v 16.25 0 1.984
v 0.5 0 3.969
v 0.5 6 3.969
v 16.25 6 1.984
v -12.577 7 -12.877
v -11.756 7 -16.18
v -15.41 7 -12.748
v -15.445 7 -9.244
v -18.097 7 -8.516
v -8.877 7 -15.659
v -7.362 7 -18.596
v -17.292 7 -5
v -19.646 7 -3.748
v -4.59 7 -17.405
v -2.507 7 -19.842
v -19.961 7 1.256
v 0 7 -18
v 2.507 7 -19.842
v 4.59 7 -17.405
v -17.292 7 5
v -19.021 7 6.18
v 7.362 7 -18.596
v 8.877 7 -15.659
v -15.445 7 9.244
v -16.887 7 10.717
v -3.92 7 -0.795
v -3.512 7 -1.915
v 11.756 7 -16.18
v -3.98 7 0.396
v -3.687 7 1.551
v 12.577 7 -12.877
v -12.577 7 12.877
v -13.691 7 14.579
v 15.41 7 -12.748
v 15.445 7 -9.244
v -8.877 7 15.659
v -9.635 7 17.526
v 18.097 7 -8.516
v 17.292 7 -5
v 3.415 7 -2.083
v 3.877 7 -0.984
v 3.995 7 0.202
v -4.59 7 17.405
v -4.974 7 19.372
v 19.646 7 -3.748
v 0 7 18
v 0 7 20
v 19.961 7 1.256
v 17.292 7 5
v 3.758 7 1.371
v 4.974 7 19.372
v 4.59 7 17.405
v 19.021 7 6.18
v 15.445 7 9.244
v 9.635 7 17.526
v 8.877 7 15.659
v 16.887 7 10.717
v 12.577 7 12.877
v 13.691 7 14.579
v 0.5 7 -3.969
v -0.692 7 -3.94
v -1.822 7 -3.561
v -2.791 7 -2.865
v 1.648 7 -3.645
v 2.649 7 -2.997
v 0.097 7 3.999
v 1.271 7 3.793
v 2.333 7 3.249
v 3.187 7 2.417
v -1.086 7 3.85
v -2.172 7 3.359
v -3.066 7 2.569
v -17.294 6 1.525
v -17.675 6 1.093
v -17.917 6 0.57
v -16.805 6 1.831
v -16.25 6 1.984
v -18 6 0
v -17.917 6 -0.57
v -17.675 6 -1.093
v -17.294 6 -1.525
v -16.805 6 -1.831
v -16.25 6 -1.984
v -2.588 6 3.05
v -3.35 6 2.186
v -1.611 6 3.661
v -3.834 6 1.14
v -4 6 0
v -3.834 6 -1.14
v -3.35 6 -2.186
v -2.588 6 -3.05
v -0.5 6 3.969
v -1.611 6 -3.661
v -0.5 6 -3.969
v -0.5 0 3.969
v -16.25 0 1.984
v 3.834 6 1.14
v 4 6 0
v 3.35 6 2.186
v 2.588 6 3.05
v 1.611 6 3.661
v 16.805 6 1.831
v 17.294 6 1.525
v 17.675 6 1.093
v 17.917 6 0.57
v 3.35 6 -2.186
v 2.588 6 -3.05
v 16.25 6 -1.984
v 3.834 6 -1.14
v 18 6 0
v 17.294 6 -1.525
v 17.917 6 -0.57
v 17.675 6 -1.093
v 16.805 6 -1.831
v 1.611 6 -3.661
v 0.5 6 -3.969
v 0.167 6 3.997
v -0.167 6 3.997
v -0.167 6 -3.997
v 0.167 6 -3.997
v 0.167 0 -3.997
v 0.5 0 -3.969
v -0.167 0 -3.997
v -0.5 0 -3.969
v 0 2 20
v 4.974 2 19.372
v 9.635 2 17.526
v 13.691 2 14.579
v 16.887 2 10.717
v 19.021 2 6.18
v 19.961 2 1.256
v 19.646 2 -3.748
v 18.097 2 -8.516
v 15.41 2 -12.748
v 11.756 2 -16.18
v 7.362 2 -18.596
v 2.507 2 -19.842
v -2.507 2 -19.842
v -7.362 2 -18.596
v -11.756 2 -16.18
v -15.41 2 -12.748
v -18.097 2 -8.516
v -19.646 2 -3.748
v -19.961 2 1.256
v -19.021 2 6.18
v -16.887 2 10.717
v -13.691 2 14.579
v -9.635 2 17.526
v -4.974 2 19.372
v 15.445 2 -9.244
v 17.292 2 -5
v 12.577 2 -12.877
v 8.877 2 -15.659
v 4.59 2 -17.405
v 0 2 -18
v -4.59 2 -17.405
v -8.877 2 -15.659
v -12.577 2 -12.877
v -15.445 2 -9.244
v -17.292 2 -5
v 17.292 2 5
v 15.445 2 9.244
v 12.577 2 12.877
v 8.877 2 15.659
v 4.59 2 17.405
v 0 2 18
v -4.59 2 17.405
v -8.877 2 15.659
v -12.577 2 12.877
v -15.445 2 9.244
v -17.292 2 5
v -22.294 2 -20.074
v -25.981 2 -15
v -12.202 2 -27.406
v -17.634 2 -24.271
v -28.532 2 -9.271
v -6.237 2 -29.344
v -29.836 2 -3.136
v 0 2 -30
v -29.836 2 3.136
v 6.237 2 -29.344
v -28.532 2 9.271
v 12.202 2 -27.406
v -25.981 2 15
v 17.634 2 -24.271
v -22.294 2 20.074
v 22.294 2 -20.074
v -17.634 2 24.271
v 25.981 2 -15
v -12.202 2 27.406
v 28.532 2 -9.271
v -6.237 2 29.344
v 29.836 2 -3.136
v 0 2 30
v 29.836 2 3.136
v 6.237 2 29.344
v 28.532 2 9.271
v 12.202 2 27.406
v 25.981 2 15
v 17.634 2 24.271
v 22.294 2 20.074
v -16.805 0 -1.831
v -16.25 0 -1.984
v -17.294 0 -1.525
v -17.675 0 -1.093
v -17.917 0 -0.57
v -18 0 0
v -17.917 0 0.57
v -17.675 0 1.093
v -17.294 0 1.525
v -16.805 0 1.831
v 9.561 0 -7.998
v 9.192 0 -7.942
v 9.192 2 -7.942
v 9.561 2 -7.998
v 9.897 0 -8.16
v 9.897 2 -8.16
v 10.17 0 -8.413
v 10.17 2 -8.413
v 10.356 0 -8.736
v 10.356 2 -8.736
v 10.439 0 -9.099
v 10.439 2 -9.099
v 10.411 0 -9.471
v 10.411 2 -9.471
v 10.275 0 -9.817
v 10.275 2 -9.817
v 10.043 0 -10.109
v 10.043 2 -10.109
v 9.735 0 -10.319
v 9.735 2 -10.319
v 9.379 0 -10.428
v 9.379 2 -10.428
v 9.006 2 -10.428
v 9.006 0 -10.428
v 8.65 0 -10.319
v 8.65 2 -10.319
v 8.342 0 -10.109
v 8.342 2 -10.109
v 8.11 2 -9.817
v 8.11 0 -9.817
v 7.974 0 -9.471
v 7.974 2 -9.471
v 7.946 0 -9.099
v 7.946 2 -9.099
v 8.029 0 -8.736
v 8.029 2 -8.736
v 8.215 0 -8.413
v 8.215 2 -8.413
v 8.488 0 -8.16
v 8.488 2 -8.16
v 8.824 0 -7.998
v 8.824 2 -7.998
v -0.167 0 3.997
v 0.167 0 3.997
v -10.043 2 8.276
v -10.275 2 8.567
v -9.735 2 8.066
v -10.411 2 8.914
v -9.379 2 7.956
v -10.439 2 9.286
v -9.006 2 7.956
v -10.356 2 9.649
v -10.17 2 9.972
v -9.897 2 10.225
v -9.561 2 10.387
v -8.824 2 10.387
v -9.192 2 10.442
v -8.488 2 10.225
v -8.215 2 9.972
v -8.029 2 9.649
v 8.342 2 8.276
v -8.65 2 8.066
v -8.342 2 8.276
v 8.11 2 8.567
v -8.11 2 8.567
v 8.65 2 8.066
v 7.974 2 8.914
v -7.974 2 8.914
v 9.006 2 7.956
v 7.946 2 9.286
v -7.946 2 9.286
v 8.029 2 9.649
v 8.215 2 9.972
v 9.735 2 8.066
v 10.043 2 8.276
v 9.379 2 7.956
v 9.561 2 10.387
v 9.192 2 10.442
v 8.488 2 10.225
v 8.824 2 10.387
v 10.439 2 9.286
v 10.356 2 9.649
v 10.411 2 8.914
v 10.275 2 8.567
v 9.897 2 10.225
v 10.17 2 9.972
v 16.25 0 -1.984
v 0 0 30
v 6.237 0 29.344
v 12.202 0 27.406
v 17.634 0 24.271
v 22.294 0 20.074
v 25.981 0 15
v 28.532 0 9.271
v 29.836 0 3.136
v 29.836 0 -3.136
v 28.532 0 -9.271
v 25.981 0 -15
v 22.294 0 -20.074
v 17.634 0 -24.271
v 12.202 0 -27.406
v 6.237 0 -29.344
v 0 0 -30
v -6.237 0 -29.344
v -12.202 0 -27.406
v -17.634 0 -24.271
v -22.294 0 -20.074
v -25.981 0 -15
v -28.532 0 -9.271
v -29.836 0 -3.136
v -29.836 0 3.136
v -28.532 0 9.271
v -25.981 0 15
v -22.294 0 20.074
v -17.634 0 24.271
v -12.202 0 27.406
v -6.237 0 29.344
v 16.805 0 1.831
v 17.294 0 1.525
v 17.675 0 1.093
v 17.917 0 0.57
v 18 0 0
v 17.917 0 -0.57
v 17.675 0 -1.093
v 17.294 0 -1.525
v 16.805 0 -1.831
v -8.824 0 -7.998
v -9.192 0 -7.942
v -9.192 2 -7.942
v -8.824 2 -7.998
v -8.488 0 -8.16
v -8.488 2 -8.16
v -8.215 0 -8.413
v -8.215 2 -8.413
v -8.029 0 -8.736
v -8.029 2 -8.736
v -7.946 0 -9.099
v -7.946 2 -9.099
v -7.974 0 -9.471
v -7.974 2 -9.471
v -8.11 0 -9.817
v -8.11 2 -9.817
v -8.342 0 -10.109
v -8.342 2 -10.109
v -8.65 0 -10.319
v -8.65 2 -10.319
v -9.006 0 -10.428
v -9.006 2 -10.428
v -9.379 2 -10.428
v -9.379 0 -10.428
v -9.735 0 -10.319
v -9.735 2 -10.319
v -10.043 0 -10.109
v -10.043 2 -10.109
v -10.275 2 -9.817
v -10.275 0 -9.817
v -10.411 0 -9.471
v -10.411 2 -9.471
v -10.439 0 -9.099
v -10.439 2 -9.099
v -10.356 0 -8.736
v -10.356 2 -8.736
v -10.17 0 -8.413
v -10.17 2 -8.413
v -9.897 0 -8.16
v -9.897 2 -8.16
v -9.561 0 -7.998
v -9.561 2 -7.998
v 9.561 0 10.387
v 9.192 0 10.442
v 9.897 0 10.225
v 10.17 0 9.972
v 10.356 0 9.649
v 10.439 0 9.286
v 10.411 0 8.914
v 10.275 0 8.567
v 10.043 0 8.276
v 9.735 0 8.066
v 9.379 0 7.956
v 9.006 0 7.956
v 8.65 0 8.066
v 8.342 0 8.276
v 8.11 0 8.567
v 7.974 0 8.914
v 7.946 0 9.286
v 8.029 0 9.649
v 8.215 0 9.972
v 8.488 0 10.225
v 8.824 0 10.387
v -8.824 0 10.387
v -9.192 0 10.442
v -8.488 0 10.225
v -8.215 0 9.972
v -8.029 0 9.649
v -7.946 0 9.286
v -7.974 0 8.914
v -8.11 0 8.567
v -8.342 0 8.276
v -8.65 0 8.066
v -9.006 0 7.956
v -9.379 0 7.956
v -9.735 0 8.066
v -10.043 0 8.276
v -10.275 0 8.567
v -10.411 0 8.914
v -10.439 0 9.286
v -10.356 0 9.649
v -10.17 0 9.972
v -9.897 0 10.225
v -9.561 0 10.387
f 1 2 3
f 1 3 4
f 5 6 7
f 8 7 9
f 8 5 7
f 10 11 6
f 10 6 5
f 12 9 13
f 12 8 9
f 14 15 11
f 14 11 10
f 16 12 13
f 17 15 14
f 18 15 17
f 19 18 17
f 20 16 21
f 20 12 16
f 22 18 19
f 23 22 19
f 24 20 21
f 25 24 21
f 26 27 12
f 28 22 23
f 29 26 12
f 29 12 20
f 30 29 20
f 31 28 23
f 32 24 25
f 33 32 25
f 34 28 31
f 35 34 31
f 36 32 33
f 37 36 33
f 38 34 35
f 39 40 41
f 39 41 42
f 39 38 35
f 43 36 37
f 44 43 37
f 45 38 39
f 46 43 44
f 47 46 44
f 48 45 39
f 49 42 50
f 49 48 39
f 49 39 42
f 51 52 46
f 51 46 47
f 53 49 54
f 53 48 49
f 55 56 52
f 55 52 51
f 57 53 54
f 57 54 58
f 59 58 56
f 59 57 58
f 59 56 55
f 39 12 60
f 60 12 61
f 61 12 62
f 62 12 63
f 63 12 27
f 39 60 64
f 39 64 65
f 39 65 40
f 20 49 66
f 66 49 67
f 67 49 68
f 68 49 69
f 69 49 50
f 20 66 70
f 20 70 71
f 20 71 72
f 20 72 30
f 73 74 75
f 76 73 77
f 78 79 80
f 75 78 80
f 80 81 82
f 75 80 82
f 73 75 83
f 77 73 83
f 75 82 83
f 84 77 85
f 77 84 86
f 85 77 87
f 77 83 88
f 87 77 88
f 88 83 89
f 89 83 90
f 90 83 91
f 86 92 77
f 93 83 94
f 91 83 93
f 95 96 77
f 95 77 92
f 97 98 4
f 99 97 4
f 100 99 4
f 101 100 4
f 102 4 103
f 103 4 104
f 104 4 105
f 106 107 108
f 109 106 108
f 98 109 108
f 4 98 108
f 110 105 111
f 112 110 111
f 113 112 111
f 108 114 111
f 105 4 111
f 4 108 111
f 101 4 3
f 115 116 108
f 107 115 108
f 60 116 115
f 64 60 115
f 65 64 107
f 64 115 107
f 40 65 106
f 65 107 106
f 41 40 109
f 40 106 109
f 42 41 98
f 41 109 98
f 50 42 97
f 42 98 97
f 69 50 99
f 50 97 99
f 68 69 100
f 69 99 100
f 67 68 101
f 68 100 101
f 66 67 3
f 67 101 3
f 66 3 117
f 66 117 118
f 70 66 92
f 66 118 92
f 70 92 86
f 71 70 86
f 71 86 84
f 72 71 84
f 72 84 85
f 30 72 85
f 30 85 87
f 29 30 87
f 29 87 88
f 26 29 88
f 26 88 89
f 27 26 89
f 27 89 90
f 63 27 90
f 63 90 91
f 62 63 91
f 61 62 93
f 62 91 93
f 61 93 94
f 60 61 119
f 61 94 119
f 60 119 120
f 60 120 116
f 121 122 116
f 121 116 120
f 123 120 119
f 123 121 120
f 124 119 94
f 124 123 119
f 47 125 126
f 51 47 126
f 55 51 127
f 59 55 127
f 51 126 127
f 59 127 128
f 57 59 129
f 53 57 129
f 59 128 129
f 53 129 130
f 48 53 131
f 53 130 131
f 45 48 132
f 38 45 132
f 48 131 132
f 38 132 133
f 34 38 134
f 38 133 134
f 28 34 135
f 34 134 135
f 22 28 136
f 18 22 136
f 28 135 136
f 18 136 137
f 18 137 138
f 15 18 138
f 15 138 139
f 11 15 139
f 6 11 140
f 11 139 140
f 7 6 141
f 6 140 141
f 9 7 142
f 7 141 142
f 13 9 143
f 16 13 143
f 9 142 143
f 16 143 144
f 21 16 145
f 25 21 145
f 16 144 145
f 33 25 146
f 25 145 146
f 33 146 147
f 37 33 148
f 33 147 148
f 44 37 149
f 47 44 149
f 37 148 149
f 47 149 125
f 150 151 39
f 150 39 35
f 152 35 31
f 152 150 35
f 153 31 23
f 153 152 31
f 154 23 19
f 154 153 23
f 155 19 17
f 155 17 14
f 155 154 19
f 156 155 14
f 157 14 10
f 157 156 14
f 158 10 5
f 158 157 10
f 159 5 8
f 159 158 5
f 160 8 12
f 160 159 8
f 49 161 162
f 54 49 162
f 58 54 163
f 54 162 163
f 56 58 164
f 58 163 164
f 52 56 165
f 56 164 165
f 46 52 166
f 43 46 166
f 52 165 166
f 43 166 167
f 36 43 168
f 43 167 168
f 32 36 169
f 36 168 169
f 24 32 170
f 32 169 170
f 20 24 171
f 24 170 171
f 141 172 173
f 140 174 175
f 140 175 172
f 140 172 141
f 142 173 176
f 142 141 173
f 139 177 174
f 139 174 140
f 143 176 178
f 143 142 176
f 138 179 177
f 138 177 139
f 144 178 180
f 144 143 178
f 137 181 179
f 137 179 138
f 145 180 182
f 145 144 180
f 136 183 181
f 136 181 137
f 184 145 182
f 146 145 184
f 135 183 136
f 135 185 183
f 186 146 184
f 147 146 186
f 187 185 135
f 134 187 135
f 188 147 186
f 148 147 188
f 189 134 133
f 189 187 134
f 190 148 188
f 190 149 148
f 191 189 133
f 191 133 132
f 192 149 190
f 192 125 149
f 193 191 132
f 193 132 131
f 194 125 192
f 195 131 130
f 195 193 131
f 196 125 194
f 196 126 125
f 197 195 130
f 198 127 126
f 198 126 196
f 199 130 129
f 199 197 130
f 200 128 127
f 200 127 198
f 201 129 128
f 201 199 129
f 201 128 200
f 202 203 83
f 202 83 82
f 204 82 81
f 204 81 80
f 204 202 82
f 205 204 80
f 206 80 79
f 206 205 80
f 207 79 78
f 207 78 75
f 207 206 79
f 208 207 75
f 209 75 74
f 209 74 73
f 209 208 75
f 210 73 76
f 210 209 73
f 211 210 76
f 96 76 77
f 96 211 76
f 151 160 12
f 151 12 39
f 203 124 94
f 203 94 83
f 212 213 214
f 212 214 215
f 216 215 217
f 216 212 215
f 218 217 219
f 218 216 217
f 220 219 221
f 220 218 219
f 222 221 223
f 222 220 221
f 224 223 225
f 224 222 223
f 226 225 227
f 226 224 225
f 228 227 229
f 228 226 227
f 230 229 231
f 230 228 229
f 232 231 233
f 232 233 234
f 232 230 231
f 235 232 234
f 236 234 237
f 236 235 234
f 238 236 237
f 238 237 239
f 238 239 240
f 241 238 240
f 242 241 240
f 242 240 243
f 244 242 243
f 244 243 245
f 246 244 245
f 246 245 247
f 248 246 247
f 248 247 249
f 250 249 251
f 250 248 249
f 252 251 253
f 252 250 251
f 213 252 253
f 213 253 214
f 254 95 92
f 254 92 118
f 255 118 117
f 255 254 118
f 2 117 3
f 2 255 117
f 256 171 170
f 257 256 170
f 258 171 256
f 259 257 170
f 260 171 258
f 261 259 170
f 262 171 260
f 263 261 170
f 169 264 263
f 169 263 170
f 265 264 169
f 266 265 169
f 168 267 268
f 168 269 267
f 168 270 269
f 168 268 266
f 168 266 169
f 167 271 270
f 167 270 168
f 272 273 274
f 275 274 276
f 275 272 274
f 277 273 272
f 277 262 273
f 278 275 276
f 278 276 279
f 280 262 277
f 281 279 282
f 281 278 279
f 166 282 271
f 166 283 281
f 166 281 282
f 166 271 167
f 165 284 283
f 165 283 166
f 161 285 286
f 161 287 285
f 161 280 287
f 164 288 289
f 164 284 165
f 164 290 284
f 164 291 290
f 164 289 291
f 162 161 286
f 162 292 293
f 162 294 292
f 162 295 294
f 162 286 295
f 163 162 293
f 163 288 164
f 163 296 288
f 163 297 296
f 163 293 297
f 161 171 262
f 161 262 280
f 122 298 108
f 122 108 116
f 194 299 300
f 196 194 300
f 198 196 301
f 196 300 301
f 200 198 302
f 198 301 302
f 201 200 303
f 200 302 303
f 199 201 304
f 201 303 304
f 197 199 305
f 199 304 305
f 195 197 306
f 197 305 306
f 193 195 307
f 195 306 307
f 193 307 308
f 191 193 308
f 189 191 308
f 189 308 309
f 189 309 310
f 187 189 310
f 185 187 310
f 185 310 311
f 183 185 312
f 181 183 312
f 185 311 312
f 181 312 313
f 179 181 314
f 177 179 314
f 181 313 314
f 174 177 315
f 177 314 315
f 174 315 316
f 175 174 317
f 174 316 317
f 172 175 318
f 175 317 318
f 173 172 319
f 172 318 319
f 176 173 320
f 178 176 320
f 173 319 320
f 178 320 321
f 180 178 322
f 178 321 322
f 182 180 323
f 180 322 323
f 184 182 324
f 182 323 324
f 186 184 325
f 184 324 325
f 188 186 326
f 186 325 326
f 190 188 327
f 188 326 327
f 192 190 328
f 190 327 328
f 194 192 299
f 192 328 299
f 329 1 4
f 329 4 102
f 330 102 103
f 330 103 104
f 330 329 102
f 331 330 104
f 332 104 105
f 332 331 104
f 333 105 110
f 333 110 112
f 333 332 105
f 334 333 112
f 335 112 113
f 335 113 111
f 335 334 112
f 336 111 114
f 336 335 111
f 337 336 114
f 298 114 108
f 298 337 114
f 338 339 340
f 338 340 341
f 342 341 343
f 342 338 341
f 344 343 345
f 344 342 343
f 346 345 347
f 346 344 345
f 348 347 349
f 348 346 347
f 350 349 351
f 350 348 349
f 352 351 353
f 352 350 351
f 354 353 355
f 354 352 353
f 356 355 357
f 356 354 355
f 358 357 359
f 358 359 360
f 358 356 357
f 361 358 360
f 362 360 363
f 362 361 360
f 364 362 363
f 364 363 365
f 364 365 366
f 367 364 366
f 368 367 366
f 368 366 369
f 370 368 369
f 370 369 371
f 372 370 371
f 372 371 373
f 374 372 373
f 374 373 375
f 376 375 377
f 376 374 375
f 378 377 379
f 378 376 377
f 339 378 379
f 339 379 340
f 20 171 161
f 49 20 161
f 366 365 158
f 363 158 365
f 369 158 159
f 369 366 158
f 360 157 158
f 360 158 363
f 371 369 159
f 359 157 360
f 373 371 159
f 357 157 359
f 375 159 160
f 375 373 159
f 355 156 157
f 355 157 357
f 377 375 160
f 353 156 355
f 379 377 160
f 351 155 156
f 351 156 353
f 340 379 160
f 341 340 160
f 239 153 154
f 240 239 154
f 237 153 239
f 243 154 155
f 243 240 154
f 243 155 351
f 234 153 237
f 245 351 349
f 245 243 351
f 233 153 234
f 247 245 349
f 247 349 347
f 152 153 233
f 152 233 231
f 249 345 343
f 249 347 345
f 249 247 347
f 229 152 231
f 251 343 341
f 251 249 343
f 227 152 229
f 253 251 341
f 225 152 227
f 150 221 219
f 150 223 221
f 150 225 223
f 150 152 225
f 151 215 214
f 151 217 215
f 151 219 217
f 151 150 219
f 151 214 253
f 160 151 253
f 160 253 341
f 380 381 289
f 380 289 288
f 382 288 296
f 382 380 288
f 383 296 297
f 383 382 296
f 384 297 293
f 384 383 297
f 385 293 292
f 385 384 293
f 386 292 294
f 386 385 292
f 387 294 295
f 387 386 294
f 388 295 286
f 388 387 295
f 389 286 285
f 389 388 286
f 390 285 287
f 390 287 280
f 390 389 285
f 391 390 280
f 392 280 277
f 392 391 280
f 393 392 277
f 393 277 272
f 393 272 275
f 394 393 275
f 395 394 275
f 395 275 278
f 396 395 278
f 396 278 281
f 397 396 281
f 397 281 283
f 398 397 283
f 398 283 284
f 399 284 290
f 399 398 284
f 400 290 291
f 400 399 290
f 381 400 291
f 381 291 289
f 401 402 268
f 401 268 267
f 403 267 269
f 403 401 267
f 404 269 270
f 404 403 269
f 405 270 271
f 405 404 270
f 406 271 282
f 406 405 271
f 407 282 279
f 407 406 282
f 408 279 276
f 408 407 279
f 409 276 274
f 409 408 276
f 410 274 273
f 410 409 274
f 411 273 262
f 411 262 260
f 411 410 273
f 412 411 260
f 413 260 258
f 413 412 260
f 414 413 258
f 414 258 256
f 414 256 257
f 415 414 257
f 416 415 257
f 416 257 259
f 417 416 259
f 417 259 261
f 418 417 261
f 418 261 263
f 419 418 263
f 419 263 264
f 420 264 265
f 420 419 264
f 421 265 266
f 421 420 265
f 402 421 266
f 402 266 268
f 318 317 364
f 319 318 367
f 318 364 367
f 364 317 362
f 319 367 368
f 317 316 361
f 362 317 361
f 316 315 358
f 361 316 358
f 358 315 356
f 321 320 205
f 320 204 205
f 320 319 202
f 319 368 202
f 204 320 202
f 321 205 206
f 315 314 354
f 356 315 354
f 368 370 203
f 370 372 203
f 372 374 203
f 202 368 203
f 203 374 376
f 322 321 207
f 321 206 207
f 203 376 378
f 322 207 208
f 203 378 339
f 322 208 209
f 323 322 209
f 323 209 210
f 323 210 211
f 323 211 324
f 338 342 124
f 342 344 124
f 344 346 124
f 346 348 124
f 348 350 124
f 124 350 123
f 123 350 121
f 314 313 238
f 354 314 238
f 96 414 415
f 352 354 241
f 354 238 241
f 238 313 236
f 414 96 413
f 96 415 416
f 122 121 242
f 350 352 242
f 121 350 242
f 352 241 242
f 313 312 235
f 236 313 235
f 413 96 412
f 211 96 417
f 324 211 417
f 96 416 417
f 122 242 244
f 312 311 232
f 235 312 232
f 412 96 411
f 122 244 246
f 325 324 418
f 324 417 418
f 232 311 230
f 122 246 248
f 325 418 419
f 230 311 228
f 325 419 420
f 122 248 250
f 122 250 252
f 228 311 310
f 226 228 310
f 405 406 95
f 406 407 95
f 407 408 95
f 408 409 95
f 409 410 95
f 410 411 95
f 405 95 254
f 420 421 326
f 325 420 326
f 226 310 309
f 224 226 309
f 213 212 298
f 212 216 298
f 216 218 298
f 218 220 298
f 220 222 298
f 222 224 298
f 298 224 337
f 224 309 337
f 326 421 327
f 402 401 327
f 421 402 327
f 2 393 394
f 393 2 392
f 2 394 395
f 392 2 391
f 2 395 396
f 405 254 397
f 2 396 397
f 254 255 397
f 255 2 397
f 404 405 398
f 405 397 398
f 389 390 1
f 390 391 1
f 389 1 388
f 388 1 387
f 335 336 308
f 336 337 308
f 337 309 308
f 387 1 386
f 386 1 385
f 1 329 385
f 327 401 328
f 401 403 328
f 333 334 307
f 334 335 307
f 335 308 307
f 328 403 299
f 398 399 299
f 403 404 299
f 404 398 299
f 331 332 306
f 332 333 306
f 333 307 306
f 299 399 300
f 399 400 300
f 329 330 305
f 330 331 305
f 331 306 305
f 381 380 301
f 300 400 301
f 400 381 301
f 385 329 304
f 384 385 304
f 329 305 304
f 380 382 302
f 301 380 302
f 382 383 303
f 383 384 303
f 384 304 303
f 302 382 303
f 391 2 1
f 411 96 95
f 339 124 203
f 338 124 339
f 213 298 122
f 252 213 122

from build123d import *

# Parameters (mm, degrees)
SKETCH_1_R          = 30
SKETCH_1_R_2        = 1.25
EXTRUDE_1_DEPTH     = 2
SKETCH_2_R          = 20
EXTRUDE_2_DEPTH     = 5
CUT_EXTRUDE_1_DEPTH = 6
SKETCH_5_R          = 4
CUT_EXTRUDE_2_DEPTH = 6


with BuildPart() as part:
    # 草图1 → 凸台-拉伸1 (new body)
    with BuildSketch(Plane(origin=(0, 0, 0), x_dir=(1, 0, 0), z_dir=(0, 1, 0))):
        with Locations(Location((0, 0, 0), (0, 0, 270))):
            Circle(SKETCH_1_R)
        with Locations(Location((9.192388155, 9.192388155, 0), (0, 0, 270))):
            Circle(SKETCH_1_R_2, mode=Mode.SUBTRACT)
        with Locations(Location((9.192388155, -9.192388155, 0), (0, 0, 270))):
            Circle(SKETCH_1_R_2, mode=Mode.SUBTRACT)
        with Locations(Location((-9.192388155, -9.192388155, 0), (0, 0, 270))):
            Circle(SKETCH_1_R_2, mode=Mode.SUBTRACT)
        with Locations(Location((-9.192388155, 9.192388155, 0), (0, 0, 270))):
            Circle(SKETCH_1_R_2, mode=Mode.SUBTRACT)
    extrude(amount=EXTRUDE_1_DEPTH)

    # 草图2 → 凸台-拉伸2 (add)
    with BuildSketch(Plane(origin=(0, 2, 0), x_dir=(1, 0, 0), z_dir=(0, 1, 0))):
        with Locations(Location((0, 0, 0), (0, 0, 270))):
            Circle(SKETCH_2_R)
        with BuildLine():
            Line((-17.291616466, 5), (17.291616466, 5))
            ThreePointArc((17.291616466, 5), (0, 18), (-17.291616466, 5))
        make_face(mode=Mode.SUBTRACT)
        with BuildLine():
            Line((-17.291616466, -5), (17.291616466, -5))
            ThreePointArc((17.291616466, -5), (0, -18), (-17.291616466, -5))
        make_face(mode=Mode.SUBTRACT)
    extrude(amount=EXTRUDE_2_DEPTH)

    # 草图4 → 切除-拉伸1 (cut)
    with BuildSketch(Plane(origin=(0, 0, 0), x_dir=(-1, 0, 0), z_dir=(0, -1, 0))):
        with BuildLine():
            Line((-0.5, -3.968626967), (-16.25, -1.984313483))
            ThreePointArc((-16.25, -1.984313483), (-18, 0), (-16.25, 1.984313483))
            Line((-16.25, 1.984313483), (-0.5, 3.968626967))
            ThreePointArc((-0.5, 3.968626967), (0, 4), (0.5, 3.968626967))
            Line((0.5, 3.968626967), (16.25, 1.984313483))
            ThreePointArc((16.25, 1.984313483), (18, 0), (16.25, -1.984313483))
            Line((16.25, -1.984313483), (0.5, -3.968626967))
            ThreePointArc((0.5, -3.968626967), (0, -4), (-0.5, -3.968626967))
        make_face()
    extrude(amount=-CUT_EXTRUDE_1_DEPTH, mode=Mode.SUBTRACT)

    # 草图5 → 切除-拉伸2 (cut)
    with BuildSketch(Plane(origin=(0, 6, 0), x_dir=(-1, 0, 0), z_dir=(0, -1, 0))):
        with Locations(Location((0, 0, 0), (0, 0, 97.180755781))):
            Circle(SKETCH_5_R)
    extrude(amount=-CUT_EXTRUDE_2_DEPTH, mode=Mode.SUBTRACT)


solid = part.part
